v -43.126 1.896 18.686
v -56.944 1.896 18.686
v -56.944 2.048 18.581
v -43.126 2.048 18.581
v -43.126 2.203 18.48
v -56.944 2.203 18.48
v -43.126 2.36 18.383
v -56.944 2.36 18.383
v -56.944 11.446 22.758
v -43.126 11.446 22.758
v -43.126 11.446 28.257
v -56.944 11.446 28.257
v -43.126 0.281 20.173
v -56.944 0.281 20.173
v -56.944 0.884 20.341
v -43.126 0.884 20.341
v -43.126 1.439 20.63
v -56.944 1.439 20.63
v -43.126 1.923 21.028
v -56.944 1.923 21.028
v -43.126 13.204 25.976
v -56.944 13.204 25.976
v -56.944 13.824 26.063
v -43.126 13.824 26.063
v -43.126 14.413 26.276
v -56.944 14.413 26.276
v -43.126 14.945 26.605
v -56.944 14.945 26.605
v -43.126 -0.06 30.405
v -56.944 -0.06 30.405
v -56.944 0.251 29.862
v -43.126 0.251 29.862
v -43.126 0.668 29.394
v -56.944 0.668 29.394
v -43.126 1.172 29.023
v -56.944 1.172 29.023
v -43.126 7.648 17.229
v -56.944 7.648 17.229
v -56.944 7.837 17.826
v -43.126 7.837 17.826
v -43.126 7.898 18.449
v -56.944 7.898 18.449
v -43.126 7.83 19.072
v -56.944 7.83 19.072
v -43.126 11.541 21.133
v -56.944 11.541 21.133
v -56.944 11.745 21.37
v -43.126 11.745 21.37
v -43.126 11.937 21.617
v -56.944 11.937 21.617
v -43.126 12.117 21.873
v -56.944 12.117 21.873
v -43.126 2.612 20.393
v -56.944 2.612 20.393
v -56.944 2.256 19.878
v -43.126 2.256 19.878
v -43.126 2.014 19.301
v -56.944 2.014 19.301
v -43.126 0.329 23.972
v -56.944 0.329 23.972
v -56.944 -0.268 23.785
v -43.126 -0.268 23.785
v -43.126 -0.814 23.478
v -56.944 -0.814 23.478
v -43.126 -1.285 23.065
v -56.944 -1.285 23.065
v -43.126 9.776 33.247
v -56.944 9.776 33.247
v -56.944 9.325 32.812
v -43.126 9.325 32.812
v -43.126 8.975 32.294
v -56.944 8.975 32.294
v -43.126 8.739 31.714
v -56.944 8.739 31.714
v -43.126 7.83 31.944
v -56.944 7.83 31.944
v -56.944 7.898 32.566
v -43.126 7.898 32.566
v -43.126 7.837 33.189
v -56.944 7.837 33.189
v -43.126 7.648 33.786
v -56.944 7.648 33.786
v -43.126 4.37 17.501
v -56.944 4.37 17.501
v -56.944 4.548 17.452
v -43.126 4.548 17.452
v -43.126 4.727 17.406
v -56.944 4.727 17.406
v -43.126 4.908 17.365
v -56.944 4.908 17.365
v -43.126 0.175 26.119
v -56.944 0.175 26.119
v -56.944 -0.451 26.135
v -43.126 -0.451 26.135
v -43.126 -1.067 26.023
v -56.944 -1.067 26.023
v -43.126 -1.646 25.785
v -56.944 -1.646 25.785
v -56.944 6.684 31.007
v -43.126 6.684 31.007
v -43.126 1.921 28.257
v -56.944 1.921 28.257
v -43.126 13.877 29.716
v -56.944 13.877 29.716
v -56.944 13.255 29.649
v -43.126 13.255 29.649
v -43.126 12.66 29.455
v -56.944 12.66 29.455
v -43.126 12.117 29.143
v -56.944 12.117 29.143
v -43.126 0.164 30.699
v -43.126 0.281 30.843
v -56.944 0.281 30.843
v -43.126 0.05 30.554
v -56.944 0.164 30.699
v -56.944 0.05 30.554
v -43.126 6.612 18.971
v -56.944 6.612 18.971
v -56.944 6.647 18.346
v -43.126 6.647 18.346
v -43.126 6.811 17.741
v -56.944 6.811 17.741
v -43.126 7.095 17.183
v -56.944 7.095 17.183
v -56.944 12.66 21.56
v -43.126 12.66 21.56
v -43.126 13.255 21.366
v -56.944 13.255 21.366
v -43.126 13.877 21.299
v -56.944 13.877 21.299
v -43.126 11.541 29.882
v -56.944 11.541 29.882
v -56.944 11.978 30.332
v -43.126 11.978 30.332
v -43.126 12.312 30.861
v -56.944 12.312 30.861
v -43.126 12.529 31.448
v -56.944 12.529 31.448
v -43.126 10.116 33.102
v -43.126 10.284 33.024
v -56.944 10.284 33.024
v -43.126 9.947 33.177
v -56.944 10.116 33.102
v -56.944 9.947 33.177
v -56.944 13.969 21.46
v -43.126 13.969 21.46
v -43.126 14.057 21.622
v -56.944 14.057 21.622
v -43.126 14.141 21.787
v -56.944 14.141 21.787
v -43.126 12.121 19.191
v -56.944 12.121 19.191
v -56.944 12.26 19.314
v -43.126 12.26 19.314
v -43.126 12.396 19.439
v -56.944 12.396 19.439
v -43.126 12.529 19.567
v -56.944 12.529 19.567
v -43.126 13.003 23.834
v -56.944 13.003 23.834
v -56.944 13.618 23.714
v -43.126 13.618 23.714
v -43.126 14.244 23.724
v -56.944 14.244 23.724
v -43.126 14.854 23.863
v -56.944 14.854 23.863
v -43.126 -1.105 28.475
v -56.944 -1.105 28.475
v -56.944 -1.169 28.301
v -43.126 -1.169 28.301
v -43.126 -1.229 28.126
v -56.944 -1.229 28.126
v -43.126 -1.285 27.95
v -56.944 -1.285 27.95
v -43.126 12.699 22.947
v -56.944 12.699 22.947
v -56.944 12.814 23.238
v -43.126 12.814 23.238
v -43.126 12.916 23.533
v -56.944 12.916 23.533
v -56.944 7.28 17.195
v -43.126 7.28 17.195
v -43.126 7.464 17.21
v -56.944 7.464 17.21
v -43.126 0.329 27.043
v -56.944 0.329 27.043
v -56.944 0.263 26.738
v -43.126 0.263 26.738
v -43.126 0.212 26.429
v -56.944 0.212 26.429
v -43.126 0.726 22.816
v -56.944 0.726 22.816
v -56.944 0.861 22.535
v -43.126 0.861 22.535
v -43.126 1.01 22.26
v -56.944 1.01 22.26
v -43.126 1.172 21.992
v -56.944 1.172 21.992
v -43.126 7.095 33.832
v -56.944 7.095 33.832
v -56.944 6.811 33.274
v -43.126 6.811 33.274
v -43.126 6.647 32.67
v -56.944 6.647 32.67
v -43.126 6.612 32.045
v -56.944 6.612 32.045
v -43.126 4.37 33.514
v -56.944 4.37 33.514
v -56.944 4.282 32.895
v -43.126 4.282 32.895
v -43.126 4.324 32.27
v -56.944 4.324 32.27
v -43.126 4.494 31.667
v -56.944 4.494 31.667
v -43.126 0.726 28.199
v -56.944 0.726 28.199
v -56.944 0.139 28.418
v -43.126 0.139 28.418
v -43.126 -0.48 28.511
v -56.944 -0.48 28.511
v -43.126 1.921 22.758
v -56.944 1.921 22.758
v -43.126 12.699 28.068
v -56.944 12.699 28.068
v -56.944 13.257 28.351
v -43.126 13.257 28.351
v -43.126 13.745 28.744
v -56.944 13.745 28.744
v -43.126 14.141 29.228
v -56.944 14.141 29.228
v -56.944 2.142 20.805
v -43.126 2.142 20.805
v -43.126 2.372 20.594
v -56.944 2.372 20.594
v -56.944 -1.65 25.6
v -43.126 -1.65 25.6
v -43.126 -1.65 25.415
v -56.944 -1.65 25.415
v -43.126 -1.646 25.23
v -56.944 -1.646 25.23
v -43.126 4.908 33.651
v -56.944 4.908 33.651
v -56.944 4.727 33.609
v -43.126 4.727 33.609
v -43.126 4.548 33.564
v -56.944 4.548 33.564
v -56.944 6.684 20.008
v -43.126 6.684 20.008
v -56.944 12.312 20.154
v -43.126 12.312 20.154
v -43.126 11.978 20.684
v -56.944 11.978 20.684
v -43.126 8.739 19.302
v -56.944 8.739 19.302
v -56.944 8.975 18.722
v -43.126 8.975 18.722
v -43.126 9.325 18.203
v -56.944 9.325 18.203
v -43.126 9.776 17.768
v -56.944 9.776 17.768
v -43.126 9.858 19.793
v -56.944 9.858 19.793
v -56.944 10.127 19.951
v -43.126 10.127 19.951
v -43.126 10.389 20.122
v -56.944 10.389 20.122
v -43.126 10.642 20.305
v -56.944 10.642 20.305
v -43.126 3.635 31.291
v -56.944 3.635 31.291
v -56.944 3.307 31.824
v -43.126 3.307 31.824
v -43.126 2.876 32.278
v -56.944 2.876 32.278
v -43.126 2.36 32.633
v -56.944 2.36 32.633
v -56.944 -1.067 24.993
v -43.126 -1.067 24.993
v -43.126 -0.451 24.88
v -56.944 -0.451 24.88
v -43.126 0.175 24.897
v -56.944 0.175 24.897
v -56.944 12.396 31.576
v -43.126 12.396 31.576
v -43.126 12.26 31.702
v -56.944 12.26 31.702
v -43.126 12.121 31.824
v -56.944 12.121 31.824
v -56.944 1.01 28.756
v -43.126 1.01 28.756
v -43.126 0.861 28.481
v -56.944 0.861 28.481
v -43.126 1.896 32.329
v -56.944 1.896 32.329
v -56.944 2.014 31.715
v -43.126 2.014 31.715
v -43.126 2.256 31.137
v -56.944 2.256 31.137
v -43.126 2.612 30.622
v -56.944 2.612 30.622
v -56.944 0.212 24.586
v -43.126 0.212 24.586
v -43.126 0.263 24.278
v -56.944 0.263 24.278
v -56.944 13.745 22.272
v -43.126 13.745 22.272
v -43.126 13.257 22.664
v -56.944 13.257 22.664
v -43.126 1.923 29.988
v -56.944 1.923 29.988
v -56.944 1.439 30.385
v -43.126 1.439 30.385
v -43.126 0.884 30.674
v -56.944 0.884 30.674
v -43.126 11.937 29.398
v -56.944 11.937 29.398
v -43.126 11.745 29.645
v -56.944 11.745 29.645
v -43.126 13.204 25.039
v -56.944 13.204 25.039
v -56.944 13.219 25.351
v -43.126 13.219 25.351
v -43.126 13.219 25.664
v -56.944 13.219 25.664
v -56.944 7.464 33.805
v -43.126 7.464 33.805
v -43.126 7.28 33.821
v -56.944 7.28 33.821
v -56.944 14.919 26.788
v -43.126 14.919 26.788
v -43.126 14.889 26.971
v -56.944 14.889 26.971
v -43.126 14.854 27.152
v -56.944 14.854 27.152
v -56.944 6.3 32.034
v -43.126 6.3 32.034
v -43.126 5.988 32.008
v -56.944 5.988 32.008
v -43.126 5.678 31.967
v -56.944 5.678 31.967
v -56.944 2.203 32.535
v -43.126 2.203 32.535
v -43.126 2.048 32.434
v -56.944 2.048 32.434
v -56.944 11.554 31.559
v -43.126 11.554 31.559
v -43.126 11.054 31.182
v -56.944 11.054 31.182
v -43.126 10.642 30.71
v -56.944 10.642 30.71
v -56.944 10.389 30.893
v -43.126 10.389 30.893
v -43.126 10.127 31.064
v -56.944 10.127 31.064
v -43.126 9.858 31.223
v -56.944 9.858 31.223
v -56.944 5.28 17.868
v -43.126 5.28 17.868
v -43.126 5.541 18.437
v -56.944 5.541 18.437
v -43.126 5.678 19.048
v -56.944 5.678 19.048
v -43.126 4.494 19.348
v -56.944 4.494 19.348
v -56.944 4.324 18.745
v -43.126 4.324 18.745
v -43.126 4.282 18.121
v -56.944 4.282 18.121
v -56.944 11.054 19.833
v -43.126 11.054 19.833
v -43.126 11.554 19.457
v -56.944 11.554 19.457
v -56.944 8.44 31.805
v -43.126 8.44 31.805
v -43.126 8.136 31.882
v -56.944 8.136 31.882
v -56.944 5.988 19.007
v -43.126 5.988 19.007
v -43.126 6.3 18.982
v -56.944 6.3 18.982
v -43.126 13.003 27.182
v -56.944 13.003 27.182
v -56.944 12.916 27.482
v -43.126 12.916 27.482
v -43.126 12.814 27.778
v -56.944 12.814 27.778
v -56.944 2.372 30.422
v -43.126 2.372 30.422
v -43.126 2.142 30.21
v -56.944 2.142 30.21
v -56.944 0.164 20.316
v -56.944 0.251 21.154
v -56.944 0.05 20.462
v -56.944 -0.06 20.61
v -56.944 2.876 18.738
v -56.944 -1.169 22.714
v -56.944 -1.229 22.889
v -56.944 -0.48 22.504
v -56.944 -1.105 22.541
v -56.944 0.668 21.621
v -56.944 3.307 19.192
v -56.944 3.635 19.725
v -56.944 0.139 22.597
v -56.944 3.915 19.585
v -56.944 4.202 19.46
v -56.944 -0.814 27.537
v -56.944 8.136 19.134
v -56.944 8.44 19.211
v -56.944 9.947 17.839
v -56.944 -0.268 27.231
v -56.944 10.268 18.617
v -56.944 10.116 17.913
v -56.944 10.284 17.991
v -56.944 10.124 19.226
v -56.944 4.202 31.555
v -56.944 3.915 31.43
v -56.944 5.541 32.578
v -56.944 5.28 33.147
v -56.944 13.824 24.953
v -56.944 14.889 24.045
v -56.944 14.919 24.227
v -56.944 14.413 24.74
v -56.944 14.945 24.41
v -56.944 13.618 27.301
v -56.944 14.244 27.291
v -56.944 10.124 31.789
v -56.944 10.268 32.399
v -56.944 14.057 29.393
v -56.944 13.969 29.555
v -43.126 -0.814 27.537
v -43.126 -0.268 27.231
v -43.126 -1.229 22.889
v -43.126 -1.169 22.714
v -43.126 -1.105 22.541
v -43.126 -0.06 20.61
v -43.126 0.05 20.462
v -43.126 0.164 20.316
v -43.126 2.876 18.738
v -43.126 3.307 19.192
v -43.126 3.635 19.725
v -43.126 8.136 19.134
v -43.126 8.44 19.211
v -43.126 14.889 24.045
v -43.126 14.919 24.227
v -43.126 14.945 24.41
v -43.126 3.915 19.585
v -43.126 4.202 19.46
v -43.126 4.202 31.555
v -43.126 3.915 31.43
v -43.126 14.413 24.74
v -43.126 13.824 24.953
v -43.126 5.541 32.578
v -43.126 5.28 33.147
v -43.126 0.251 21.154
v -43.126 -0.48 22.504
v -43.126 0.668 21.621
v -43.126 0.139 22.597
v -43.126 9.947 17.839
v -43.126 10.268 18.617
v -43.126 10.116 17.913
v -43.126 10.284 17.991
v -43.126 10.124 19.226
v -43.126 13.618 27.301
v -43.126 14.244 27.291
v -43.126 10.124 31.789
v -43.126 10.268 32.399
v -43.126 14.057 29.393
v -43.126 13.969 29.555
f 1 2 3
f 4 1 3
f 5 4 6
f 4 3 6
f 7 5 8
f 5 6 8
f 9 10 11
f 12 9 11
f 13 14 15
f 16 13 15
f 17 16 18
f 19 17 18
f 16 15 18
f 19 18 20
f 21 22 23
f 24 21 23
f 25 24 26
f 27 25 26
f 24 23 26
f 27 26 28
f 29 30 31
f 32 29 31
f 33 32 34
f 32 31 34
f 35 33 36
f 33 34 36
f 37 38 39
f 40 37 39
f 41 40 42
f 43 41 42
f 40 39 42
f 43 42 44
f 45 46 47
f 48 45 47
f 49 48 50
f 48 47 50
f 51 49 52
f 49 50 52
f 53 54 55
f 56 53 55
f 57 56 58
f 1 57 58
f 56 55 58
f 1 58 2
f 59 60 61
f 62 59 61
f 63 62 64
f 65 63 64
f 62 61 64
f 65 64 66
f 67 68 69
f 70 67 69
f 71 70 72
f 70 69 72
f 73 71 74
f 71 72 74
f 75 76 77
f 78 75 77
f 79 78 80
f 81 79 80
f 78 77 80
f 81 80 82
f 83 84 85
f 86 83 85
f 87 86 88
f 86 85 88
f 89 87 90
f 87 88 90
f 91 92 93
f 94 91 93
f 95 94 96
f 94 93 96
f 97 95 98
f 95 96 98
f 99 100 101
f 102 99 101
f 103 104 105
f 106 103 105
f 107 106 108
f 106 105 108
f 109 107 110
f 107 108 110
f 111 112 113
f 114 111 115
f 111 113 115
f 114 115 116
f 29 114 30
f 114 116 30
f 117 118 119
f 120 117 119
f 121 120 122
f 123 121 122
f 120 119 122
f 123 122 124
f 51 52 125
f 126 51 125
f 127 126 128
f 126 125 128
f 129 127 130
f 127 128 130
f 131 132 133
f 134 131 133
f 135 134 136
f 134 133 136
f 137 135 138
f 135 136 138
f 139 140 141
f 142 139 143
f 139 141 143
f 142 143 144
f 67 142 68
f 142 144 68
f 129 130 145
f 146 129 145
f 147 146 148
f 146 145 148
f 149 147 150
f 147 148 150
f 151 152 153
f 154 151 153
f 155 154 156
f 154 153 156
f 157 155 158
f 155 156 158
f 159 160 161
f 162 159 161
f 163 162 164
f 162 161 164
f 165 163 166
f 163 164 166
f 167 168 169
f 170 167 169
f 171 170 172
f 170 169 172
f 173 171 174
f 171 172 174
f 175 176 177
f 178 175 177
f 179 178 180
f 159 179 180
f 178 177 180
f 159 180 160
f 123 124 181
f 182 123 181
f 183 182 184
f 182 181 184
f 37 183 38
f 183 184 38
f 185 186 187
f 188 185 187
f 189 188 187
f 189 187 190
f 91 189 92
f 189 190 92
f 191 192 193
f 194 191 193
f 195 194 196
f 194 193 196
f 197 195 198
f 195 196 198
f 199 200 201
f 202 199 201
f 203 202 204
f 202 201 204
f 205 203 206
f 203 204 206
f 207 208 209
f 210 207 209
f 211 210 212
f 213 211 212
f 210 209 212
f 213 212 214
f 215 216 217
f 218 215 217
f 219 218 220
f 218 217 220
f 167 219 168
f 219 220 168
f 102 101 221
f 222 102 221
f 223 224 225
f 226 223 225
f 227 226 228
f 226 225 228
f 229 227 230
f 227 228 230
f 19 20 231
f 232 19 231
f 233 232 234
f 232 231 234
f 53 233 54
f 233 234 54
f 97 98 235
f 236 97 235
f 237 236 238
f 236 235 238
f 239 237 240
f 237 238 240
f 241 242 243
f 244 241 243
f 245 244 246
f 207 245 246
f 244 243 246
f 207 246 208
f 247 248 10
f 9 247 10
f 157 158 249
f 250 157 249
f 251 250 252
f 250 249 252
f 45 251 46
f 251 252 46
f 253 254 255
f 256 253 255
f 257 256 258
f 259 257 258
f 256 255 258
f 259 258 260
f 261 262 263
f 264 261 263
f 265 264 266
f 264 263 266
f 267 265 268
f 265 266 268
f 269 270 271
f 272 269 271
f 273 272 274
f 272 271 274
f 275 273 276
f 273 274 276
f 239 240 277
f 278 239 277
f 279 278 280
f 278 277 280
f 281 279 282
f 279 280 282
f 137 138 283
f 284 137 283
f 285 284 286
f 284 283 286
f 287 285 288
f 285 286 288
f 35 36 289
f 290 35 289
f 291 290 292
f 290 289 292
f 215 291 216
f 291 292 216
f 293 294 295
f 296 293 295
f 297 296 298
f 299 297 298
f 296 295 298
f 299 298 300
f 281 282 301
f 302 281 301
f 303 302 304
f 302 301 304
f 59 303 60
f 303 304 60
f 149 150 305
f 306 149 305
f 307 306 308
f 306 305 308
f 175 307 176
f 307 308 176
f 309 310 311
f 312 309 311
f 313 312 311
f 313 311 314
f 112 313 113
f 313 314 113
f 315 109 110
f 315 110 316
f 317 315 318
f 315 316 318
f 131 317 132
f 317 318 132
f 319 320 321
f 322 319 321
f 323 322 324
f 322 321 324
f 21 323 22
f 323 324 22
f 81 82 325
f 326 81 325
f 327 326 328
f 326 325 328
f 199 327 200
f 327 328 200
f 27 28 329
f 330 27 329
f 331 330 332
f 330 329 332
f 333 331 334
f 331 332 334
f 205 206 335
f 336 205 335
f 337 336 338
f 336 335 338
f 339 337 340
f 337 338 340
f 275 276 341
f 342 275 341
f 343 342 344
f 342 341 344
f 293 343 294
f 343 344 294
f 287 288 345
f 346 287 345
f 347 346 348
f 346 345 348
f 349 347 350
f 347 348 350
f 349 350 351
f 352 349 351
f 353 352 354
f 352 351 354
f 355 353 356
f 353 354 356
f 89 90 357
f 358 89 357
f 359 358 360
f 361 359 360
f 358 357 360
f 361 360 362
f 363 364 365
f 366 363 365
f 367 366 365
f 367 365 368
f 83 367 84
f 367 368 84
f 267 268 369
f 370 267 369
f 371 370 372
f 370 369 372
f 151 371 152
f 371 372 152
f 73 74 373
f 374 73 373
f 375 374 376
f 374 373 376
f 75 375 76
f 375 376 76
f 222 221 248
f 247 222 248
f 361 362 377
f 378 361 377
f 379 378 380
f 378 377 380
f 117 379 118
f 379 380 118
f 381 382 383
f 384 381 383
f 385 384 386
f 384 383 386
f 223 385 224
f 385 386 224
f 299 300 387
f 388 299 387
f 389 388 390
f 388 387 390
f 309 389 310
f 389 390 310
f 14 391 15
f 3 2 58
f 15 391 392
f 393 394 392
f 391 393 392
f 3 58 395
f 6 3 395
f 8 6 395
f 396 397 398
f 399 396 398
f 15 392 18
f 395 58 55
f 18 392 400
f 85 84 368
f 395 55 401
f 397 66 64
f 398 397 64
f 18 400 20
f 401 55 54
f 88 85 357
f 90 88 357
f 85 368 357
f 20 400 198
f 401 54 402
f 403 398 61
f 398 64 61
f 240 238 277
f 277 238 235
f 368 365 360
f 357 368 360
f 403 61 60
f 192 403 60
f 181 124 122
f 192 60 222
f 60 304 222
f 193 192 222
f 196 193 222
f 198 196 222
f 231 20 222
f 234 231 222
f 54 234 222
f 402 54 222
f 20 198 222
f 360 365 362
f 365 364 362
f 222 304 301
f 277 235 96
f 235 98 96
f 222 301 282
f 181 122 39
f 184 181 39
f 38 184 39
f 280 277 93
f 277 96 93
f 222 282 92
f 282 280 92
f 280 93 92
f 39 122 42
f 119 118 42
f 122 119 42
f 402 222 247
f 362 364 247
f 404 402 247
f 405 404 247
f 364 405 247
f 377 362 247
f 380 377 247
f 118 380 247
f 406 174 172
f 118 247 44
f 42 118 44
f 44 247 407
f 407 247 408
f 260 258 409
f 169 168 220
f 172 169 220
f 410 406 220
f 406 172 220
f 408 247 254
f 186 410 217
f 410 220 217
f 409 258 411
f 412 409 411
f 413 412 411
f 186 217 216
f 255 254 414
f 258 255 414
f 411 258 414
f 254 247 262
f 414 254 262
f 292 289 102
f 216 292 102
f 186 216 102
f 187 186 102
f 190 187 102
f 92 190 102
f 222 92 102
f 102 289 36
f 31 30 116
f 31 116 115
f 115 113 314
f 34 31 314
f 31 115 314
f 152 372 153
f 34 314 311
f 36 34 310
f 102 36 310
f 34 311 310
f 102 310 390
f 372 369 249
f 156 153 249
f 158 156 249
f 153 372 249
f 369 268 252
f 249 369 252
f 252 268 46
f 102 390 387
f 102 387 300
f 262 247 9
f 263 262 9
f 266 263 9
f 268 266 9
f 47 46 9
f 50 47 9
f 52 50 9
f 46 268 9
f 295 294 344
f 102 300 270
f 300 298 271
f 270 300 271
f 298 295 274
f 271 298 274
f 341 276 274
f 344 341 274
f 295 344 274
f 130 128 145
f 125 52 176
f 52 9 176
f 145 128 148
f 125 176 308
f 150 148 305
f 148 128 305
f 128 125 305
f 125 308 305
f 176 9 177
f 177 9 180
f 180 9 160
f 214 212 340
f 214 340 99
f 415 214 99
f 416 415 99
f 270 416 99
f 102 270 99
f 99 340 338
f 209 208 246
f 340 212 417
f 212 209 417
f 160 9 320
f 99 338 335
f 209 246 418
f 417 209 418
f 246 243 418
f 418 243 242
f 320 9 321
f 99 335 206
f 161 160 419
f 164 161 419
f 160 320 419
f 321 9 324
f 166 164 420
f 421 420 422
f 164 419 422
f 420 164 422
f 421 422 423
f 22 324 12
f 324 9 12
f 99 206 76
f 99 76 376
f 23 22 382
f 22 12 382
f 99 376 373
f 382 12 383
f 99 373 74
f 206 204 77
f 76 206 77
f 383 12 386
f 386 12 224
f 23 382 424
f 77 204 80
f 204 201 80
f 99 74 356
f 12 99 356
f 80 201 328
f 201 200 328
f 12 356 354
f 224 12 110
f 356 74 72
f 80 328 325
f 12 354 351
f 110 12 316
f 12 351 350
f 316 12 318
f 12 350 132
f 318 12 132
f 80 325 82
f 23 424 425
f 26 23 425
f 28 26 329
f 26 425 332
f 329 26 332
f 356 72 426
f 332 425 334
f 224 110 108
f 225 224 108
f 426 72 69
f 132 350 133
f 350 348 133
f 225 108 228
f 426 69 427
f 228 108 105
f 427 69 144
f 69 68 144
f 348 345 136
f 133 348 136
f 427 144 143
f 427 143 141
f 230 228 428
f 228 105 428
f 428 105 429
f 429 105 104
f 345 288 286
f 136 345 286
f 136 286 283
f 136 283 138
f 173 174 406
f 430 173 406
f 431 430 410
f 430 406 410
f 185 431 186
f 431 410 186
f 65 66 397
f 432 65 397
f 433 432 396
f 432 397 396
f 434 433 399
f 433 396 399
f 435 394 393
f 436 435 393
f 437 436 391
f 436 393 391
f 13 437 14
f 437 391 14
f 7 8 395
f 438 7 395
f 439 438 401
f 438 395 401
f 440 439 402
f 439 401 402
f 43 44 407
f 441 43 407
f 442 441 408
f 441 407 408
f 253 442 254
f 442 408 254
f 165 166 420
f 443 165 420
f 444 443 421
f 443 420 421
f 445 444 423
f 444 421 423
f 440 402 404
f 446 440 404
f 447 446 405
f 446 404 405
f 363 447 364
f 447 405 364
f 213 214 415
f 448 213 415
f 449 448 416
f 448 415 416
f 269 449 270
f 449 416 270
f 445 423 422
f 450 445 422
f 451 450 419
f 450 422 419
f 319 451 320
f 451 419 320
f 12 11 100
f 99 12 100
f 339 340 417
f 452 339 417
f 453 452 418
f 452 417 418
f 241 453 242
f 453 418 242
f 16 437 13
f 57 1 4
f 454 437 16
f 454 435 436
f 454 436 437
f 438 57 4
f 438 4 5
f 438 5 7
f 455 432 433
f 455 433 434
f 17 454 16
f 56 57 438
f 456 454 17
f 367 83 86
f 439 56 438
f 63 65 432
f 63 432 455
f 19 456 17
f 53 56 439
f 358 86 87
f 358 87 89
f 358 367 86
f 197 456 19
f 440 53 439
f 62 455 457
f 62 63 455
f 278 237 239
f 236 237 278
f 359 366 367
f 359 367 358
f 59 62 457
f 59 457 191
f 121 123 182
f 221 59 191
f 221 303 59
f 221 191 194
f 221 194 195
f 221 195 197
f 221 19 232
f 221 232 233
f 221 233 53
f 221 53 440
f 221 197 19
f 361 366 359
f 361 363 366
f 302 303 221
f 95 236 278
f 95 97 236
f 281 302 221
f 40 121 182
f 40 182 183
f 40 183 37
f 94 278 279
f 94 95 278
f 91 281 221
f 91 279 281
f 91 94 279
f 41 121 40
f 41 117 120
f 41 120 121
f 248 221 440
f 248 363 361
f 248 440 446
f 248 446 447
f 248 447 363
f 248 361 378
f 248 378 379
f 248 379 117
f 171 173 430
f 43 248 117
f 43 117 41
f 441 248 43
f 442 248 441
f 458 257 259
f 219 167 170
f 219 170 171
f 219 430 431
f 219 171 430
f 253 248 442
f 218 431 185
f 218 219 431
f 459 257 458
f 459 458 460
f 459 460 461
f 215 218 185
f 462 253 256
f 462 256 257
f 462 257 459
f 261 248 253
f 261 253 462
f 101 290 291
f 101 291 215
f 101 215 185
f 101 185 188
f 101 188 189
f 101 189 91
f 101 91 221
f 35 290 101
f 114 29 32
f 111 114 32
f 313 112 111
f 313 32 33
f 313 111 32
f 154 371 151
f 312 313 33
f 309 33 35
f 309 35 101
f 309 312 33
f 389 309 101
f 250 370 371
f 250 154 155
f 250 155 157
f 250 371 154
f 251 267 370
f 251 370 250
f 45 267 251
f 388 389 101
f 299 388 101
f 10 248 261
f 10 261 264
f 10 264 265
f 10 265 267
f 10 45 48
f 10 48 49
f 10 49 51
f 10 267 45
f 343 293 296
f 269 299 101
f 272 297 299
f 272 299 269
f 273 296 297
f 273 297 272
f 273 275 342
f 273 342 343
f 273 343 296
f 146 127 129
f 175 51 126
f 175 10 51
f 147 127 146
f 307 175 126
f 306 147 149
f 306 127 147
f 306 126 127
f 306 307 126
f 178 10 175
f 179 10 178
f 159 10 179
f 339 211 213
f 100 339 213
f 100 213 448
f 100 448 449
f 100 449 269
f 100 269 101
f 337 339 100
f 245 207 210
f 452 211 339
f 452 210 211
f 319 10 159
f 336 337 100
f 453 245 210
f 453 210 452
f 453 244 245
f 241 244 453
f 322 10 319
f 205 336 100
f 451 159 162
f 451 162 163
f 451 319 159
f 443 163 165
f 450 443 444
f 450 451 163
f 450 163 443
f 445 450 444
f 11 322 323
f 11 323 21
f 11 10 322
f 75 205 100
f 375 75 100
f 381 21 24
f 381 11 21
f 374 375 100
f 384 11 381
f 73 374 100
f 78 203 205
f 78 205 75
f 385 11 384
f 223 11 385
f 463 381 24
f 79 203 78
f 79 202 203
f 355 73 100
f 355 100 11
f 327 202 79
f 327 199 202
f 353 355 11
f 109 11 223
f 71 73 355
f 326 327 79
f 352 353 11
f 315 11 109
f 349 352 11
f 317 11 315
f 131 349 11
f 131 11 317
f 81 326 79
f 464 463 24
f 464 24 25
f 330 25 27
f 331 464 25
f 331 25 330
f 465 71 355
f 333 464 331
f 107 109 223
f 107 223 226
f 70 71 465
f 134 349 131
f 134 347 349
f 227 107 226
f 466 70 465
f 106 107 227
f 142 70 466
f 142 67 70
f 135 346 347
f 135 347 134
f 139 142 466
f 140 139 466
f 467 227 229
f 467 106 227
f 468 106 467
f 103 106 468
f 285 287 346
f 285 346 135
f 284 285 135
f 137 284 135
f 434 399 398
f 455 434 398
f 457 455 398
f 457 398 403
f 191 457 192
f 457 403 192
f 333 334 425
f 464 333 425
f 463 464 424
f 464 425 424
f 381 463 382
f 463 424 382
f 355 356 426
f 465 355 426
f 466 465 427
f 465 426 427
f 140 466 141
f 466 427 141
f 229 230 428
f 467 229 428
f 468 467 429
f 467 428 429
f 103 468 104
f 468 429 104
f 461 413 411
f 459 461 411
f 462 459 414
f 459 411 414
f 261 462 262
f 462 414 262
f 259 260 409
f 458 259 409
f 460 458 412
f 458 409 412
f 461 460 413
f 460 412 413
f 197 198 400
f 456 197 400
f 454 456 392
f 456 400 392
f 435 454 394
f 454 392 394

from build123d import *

# Parameters (mm, degrees)
SPUR_START             = -56.943752669
SPUR_GEAR_AI_OUTLINE_R = 4.7625
SPUR_GEAR_AI_DEPTH     = 13.8176
CUT_EXTRUDE1_DEPTH     = 40.482760103


# Read off the part's stored shape, not the designer's step: spur gear_ai
with BuildPart() as part:
    # spur gear_ai outline → spur gear_ai (new body)
    with BuildSketch(Plane.YZ.offset(SPUR_START)):
        with BuildLine():
            ThreePointArc((13.877482254, 21.299310941), (14.013498804, 21.54095532), (14.141401376, 21.786990765))
            ThreePointArc((14.141401376, 21.786990765), (13.511259094, 22.480540591), (12.698675372, 22.947229299))
            ThreePointArc((12.698675372, 22.947229299), (12.866749459, 23.385013416), (13.003007958, 23.833719839))
            ThreePointArc((13.003007958, 23.833719839), (13.930896828, 23.702903551), (14.85415475, 23.863170414))
            ThreePointArc((14.85415475, 23.863170414), (14.904339747, 24.135886336), (14.945424627, 24.410120799))
            ThreePointArc((14.945424627, 24.410120799), (14.124229931, 24.861485317), (13.20414066, 25.039042041))
            ThreePointArc((13.20414066, 25.039042041), (13.220959759, 25.507679374), (13.20414066, 25.976316707))
            ThreePointArc((13.20414066, 25.976316707), (14.124229931, 26.15387343), (14.945424627, 26.605237949))
            ThreePointArc((14.945424627, 26.605237949), (14.904339747, 26.879472412), (14.85415475, 27.152188334))
            ThreePointArc((14.85415475, 27.152188334), (13.930896828, 27.312455197), (13.003007958, 27.181638909))
            ThreePointArc((13.003007958, 27.181638909), (12.866749459, 27.630345332), (12.698675372, 28.068129449))
            ThreePointArc((12.698675372, 28.068129449), (13.511259094, 28.534818157), (14.141401376, 29.228367983))
            ThreePointArc((14.141401376, 29.228367983), (14.013498804, 29.474403428), (13.877482254, 29.716047807))
            ThreePointArc((13.877482254, 29.716047807), (12.952210428, 29.567849612), (12.117073115, 29.142836288))
            ThreePointArc((12.117073115, 29.142836288), (11.84250274, 29.522987496), (11.5413871, 29.882477695))
            ThreePointArc((11.5413871, 29.882477695), (12.158409219, 30.587725425), (12.529213394, 31.448303673))
            ThreePointArc((12.529213394, 31.448303673), (12.328353358, 31.639478342), (12.121244757, 31.82386526))
            ThreePointArc((12.121244757, 31.82386526), (11.294226586, 31.383261581), (10.642340918, 30.710108009))
            ThreePointArc((10.642340918, 30.710108009), (10.259212627, 30.980508721), (9.857685986, 31.222748662))
            ThreePointArc((9.857685986, 31.222748662), (10.212282581, 32.09013088), (10.283566263, 33.024480543))
            ThreePointArc((10.283566263, 33.024480543), (10.031515064, 33.140077693), (9.775757844, 33.247225967))
            ThreePointArc((9.775757844, 33.247225967), (9.13661358, 32.561963049), (8.738621482, 31.713615864))
            ThreePointArc((8.738621482, 31.713615864), (8.288453171, 31.844963967), (7.830027171, 31.943703192))
            ThreePointArc((7.830027171, 31.943703192), (7.883772199, 32.879225575), (7.647810695, 33.78609537))
            ThreePointArc((7.647810695, 33.78609537), (7.371881992, 33.813588258), (7.095191416, 33.831886709))
            ThreePointArc((7.095191416, 33.831886709), (6.713182256, 32.976223424), (6.612212349, 32.044614206))
            ThreePointArc((6.612212349, 32.044614206), (6.14378674, 32.022676095), (5.678138951, 31.967214677))
            ThreePointArc((5.678138951, 31.967214677), (5.425208304, 32.869498859), (4.907571703, 33.650615372))
            ThreePointArc((4.907571703, 33.650615372), (4.637666652, 33.587024715), (4.370026438, 33.514490423))
            ThreePointArc((4.370026438, 33.514490423), (4.286549003, 32.581151163), (4.493542942, 31.667234227))
            ThreePointArc((4.493542942, 31.667234227), (4.057621217, 31.494387237), (3.635211803, 31.290735282))
            ThreePointArc((3.635211803, 31.290735282), (3.103014441, 32.062004771), (2.359796702, 32.632721907))
            ThreePointArc((2.359796702, 32.632721907), (2.125163704, 32.484938741), (1.895576821, 32.329431921))
            ThreePointArc((1.895576821, 32.329431921), (2.119677185, 31.419558478), (2.612203966, 30.622370905))
            ThreePointArc((2.612203966, 30.622370905), (2.256025009, 30.317345688), (1.922628583, 29.987572046))
            ThreePointArc((1.922628583, 29.987572046), (1.168836349, 30.544247826), (0.280576646, 30.842719527))
            ThreePointArc((0.280576646, 30.842719527), (0.106641826, 30.626758451), (-0.060012425, 30.405130681))
            ThreePointArc((-0.060012425, 30.405130681), (0.447380989, 29.61732196), (1.172067692, 29.023251392))
            ThreePointArc((1.172067692, 29.023251392), (0.934229019, 28.619102165), (0.725974258, 28.198942925))
            ThreePointArc((0.725974258, 28.198942925), (-0.167727764, 28.480700538), (-1.10477271, 28.474582766))
            ThreePointArc((-1.10477271, 28.474582766), (-1.199160815, 28.213846513), (-1.284822859, 27.950114599))
            ThreePointArc((-1.284822859, 27.950114599), (-0.549120347, 27.369741899), (0.32919523, 27.043165102))
            ThreePointArc((0.32919523, 27.043165102), (0.235470351, 26.583687704), (0.17492489, 26.11867364))
            ThreePointArc((0.17492489, 26.11867364), (-0.761840439, 26.094980276), (-1.646127267, 25.784935985))
            ThreePointArc((-1.646127267, 25.784935985), (-1.650740241, 25.507679374), (-1.646127267, 25.230422763))
            ThreePointArc((-1.646127267, 25.230422763), (-0.761840439, 24.920378472), (0.17492489, 24.896685107))
            ThreePointArc((0.17492489, 24.896685107), (0.235470351, 24.431671044), (0.32919523, 23.972193646))
            ThreePointArc((0.32919523, 23.972193646), (-0.549120347, 23.645616848), (-1.284822859, 23.065244149))
            ThreePointArc((-1.284822859, 23.065244149), (-1.199160815, 22.801512235), (-1.10477271, 22.540775982))
            ThreePointArc((-1.10477271, 22.540775982), (-0.167727765, 22.53465821), (0.725974258, 22.816415822))
            ThreePointArc((0.725974258, 22.816415822), (0.934229019, 22.396256583), (1.172067692, 21.992107356))
            ThreePointArc((1.172067692, 21.992107356), (0.447380989, 21.398036788), (-0.060012425, 20.610228067))
            ThreePointArc((-0.060012425, 20.610228067), (0.106641826, 20.388600297), (0.280576646, 20.17263922))
            ThreePointArc((0.280576646, 20.17263922), (1.168836349, 20.471110922), (1.922628583, 21.027786702))
            ThreePointArc((1.922628583, 21.027786702), (2.256025009, 20.69801306), (2.612203966, 20.392987843))
            ThreePointArc((2.612203966, 20.392987843), (2.119677185, 19.59580027), (1.895576821, 18.685926827))
            ThreePointArc((1.895576821, 18.685926827), (2.125163704, 18.530420007), (2.359796702, 18.382636841))
            ThreePointArc((2.359796702, 18.382636841), (3.103014441, 18.953353977), (3.635211803, 19.724623466))
            ThreePointArc((3.635211803, 19.724623466), (4.057621217, 19.520971511), (4.493542942, 19.348124521))
            ThreePointArc((4.493542942, 19.348124521), (4.286549003, 18.434207585), (4.370026438, 17.500868325))
            ThreePointArc((4.370026438, 17.500868325), (4.637666652, 17.428334032), (4.907571703, 17.364743376))
            ThreePointArc((4.907571703, 17.364743376), (5.425208304, 18.145859889), (5.678138951, 19.048144071))
            ThreePointArc((5.678138951, 19.048144071), (6.14378674, 18.992682653), (6.612212349, 18.970744542))
            ThreePointArc((6.612212349, 18.970744542), (6.713182256, 18.039135324), (7.095191416, 17.183472039))
            ThreePointArc((7.095191416, 17.183472039), (7.371881992, 17.20177049), (7.647810695, 17.229263378))
            ThreePointArc((7.647810695, 17.229263378), (7.883772199, 18.136133173), (7.830027171, 19.071655555))
            ThreePointArc((7.830027171, 19.071655555), (8.288453171, 19.17039478), (8.738621482, 19.301742883))
            ThreePointArc((8.738621482, 19.301742883), (9.13661358, 18.453395698), (9.775757844, 17.768132781))
            ThreePointArc((9.775757844, 17.768132781), (10.031515064, 17.875281055), (10.283566263, 17.990878205))
            ThreePointArc((10.283566263, 17.990878205), (10.212282581, 18.925227868), (9.857685986, 19.792610086))
            ThreePointArc((9.857685986, 19.792610086), (10.259212627, 20.034850026), (10.642340918, 20.305250738))
            ThreePointArc((10.642340918, 20.305250738), (11.294226586, 19.632097166), (12.121244757, 19.191493488))
            ThreePointArc((12.121244757, 19.191493488), (12.328353358, 19.375880406), (12.529213394, 19.567055074))
            ThreePointArc((12.529213394, 19.567055074), (12.158409219, 20.427633322), (11.5413871, 21.132881053))
            ThreePointArc((11.5413871, 21.132881053), (11.84250274, 21.492371252), (12.117073115, 21.87252246))
            ThreePointArc((12.117073115, 21.87252246), (12.952210428, 21.447509136), (13.877482254, 21.299310941))
        make_face()
        with Locations((6.683634759, 25.507679374)):
            Circle(SPUR_GEAR_AI_OUTLINE_R, mode=Mode.SUBTRACT)
    extrude(amount=SPUR_GEAR_AI_DEPTH)

    # Sketch1 → Cut-Extrude1 (cut, through all)
    with BuildSketch(Plane(origin=(-43.126152669, 0, 0), x_dir=(0, 0, -1), z_dir=(1, 0, 0))):
        Polygon((-22.758048717, 11.446134759), (-28.257310031, 11.446134759), (-31.006940688, 6.683634759), (-28.257310031, 1.921134759), (-22.758048717, 1.921134759), (-20.00841806, 6.683634759), align=None)
    extrude(amount=-CUT_EXTRUDE1_DEPTH, mode=Mode.SUBTRACT)


solid = part.part
